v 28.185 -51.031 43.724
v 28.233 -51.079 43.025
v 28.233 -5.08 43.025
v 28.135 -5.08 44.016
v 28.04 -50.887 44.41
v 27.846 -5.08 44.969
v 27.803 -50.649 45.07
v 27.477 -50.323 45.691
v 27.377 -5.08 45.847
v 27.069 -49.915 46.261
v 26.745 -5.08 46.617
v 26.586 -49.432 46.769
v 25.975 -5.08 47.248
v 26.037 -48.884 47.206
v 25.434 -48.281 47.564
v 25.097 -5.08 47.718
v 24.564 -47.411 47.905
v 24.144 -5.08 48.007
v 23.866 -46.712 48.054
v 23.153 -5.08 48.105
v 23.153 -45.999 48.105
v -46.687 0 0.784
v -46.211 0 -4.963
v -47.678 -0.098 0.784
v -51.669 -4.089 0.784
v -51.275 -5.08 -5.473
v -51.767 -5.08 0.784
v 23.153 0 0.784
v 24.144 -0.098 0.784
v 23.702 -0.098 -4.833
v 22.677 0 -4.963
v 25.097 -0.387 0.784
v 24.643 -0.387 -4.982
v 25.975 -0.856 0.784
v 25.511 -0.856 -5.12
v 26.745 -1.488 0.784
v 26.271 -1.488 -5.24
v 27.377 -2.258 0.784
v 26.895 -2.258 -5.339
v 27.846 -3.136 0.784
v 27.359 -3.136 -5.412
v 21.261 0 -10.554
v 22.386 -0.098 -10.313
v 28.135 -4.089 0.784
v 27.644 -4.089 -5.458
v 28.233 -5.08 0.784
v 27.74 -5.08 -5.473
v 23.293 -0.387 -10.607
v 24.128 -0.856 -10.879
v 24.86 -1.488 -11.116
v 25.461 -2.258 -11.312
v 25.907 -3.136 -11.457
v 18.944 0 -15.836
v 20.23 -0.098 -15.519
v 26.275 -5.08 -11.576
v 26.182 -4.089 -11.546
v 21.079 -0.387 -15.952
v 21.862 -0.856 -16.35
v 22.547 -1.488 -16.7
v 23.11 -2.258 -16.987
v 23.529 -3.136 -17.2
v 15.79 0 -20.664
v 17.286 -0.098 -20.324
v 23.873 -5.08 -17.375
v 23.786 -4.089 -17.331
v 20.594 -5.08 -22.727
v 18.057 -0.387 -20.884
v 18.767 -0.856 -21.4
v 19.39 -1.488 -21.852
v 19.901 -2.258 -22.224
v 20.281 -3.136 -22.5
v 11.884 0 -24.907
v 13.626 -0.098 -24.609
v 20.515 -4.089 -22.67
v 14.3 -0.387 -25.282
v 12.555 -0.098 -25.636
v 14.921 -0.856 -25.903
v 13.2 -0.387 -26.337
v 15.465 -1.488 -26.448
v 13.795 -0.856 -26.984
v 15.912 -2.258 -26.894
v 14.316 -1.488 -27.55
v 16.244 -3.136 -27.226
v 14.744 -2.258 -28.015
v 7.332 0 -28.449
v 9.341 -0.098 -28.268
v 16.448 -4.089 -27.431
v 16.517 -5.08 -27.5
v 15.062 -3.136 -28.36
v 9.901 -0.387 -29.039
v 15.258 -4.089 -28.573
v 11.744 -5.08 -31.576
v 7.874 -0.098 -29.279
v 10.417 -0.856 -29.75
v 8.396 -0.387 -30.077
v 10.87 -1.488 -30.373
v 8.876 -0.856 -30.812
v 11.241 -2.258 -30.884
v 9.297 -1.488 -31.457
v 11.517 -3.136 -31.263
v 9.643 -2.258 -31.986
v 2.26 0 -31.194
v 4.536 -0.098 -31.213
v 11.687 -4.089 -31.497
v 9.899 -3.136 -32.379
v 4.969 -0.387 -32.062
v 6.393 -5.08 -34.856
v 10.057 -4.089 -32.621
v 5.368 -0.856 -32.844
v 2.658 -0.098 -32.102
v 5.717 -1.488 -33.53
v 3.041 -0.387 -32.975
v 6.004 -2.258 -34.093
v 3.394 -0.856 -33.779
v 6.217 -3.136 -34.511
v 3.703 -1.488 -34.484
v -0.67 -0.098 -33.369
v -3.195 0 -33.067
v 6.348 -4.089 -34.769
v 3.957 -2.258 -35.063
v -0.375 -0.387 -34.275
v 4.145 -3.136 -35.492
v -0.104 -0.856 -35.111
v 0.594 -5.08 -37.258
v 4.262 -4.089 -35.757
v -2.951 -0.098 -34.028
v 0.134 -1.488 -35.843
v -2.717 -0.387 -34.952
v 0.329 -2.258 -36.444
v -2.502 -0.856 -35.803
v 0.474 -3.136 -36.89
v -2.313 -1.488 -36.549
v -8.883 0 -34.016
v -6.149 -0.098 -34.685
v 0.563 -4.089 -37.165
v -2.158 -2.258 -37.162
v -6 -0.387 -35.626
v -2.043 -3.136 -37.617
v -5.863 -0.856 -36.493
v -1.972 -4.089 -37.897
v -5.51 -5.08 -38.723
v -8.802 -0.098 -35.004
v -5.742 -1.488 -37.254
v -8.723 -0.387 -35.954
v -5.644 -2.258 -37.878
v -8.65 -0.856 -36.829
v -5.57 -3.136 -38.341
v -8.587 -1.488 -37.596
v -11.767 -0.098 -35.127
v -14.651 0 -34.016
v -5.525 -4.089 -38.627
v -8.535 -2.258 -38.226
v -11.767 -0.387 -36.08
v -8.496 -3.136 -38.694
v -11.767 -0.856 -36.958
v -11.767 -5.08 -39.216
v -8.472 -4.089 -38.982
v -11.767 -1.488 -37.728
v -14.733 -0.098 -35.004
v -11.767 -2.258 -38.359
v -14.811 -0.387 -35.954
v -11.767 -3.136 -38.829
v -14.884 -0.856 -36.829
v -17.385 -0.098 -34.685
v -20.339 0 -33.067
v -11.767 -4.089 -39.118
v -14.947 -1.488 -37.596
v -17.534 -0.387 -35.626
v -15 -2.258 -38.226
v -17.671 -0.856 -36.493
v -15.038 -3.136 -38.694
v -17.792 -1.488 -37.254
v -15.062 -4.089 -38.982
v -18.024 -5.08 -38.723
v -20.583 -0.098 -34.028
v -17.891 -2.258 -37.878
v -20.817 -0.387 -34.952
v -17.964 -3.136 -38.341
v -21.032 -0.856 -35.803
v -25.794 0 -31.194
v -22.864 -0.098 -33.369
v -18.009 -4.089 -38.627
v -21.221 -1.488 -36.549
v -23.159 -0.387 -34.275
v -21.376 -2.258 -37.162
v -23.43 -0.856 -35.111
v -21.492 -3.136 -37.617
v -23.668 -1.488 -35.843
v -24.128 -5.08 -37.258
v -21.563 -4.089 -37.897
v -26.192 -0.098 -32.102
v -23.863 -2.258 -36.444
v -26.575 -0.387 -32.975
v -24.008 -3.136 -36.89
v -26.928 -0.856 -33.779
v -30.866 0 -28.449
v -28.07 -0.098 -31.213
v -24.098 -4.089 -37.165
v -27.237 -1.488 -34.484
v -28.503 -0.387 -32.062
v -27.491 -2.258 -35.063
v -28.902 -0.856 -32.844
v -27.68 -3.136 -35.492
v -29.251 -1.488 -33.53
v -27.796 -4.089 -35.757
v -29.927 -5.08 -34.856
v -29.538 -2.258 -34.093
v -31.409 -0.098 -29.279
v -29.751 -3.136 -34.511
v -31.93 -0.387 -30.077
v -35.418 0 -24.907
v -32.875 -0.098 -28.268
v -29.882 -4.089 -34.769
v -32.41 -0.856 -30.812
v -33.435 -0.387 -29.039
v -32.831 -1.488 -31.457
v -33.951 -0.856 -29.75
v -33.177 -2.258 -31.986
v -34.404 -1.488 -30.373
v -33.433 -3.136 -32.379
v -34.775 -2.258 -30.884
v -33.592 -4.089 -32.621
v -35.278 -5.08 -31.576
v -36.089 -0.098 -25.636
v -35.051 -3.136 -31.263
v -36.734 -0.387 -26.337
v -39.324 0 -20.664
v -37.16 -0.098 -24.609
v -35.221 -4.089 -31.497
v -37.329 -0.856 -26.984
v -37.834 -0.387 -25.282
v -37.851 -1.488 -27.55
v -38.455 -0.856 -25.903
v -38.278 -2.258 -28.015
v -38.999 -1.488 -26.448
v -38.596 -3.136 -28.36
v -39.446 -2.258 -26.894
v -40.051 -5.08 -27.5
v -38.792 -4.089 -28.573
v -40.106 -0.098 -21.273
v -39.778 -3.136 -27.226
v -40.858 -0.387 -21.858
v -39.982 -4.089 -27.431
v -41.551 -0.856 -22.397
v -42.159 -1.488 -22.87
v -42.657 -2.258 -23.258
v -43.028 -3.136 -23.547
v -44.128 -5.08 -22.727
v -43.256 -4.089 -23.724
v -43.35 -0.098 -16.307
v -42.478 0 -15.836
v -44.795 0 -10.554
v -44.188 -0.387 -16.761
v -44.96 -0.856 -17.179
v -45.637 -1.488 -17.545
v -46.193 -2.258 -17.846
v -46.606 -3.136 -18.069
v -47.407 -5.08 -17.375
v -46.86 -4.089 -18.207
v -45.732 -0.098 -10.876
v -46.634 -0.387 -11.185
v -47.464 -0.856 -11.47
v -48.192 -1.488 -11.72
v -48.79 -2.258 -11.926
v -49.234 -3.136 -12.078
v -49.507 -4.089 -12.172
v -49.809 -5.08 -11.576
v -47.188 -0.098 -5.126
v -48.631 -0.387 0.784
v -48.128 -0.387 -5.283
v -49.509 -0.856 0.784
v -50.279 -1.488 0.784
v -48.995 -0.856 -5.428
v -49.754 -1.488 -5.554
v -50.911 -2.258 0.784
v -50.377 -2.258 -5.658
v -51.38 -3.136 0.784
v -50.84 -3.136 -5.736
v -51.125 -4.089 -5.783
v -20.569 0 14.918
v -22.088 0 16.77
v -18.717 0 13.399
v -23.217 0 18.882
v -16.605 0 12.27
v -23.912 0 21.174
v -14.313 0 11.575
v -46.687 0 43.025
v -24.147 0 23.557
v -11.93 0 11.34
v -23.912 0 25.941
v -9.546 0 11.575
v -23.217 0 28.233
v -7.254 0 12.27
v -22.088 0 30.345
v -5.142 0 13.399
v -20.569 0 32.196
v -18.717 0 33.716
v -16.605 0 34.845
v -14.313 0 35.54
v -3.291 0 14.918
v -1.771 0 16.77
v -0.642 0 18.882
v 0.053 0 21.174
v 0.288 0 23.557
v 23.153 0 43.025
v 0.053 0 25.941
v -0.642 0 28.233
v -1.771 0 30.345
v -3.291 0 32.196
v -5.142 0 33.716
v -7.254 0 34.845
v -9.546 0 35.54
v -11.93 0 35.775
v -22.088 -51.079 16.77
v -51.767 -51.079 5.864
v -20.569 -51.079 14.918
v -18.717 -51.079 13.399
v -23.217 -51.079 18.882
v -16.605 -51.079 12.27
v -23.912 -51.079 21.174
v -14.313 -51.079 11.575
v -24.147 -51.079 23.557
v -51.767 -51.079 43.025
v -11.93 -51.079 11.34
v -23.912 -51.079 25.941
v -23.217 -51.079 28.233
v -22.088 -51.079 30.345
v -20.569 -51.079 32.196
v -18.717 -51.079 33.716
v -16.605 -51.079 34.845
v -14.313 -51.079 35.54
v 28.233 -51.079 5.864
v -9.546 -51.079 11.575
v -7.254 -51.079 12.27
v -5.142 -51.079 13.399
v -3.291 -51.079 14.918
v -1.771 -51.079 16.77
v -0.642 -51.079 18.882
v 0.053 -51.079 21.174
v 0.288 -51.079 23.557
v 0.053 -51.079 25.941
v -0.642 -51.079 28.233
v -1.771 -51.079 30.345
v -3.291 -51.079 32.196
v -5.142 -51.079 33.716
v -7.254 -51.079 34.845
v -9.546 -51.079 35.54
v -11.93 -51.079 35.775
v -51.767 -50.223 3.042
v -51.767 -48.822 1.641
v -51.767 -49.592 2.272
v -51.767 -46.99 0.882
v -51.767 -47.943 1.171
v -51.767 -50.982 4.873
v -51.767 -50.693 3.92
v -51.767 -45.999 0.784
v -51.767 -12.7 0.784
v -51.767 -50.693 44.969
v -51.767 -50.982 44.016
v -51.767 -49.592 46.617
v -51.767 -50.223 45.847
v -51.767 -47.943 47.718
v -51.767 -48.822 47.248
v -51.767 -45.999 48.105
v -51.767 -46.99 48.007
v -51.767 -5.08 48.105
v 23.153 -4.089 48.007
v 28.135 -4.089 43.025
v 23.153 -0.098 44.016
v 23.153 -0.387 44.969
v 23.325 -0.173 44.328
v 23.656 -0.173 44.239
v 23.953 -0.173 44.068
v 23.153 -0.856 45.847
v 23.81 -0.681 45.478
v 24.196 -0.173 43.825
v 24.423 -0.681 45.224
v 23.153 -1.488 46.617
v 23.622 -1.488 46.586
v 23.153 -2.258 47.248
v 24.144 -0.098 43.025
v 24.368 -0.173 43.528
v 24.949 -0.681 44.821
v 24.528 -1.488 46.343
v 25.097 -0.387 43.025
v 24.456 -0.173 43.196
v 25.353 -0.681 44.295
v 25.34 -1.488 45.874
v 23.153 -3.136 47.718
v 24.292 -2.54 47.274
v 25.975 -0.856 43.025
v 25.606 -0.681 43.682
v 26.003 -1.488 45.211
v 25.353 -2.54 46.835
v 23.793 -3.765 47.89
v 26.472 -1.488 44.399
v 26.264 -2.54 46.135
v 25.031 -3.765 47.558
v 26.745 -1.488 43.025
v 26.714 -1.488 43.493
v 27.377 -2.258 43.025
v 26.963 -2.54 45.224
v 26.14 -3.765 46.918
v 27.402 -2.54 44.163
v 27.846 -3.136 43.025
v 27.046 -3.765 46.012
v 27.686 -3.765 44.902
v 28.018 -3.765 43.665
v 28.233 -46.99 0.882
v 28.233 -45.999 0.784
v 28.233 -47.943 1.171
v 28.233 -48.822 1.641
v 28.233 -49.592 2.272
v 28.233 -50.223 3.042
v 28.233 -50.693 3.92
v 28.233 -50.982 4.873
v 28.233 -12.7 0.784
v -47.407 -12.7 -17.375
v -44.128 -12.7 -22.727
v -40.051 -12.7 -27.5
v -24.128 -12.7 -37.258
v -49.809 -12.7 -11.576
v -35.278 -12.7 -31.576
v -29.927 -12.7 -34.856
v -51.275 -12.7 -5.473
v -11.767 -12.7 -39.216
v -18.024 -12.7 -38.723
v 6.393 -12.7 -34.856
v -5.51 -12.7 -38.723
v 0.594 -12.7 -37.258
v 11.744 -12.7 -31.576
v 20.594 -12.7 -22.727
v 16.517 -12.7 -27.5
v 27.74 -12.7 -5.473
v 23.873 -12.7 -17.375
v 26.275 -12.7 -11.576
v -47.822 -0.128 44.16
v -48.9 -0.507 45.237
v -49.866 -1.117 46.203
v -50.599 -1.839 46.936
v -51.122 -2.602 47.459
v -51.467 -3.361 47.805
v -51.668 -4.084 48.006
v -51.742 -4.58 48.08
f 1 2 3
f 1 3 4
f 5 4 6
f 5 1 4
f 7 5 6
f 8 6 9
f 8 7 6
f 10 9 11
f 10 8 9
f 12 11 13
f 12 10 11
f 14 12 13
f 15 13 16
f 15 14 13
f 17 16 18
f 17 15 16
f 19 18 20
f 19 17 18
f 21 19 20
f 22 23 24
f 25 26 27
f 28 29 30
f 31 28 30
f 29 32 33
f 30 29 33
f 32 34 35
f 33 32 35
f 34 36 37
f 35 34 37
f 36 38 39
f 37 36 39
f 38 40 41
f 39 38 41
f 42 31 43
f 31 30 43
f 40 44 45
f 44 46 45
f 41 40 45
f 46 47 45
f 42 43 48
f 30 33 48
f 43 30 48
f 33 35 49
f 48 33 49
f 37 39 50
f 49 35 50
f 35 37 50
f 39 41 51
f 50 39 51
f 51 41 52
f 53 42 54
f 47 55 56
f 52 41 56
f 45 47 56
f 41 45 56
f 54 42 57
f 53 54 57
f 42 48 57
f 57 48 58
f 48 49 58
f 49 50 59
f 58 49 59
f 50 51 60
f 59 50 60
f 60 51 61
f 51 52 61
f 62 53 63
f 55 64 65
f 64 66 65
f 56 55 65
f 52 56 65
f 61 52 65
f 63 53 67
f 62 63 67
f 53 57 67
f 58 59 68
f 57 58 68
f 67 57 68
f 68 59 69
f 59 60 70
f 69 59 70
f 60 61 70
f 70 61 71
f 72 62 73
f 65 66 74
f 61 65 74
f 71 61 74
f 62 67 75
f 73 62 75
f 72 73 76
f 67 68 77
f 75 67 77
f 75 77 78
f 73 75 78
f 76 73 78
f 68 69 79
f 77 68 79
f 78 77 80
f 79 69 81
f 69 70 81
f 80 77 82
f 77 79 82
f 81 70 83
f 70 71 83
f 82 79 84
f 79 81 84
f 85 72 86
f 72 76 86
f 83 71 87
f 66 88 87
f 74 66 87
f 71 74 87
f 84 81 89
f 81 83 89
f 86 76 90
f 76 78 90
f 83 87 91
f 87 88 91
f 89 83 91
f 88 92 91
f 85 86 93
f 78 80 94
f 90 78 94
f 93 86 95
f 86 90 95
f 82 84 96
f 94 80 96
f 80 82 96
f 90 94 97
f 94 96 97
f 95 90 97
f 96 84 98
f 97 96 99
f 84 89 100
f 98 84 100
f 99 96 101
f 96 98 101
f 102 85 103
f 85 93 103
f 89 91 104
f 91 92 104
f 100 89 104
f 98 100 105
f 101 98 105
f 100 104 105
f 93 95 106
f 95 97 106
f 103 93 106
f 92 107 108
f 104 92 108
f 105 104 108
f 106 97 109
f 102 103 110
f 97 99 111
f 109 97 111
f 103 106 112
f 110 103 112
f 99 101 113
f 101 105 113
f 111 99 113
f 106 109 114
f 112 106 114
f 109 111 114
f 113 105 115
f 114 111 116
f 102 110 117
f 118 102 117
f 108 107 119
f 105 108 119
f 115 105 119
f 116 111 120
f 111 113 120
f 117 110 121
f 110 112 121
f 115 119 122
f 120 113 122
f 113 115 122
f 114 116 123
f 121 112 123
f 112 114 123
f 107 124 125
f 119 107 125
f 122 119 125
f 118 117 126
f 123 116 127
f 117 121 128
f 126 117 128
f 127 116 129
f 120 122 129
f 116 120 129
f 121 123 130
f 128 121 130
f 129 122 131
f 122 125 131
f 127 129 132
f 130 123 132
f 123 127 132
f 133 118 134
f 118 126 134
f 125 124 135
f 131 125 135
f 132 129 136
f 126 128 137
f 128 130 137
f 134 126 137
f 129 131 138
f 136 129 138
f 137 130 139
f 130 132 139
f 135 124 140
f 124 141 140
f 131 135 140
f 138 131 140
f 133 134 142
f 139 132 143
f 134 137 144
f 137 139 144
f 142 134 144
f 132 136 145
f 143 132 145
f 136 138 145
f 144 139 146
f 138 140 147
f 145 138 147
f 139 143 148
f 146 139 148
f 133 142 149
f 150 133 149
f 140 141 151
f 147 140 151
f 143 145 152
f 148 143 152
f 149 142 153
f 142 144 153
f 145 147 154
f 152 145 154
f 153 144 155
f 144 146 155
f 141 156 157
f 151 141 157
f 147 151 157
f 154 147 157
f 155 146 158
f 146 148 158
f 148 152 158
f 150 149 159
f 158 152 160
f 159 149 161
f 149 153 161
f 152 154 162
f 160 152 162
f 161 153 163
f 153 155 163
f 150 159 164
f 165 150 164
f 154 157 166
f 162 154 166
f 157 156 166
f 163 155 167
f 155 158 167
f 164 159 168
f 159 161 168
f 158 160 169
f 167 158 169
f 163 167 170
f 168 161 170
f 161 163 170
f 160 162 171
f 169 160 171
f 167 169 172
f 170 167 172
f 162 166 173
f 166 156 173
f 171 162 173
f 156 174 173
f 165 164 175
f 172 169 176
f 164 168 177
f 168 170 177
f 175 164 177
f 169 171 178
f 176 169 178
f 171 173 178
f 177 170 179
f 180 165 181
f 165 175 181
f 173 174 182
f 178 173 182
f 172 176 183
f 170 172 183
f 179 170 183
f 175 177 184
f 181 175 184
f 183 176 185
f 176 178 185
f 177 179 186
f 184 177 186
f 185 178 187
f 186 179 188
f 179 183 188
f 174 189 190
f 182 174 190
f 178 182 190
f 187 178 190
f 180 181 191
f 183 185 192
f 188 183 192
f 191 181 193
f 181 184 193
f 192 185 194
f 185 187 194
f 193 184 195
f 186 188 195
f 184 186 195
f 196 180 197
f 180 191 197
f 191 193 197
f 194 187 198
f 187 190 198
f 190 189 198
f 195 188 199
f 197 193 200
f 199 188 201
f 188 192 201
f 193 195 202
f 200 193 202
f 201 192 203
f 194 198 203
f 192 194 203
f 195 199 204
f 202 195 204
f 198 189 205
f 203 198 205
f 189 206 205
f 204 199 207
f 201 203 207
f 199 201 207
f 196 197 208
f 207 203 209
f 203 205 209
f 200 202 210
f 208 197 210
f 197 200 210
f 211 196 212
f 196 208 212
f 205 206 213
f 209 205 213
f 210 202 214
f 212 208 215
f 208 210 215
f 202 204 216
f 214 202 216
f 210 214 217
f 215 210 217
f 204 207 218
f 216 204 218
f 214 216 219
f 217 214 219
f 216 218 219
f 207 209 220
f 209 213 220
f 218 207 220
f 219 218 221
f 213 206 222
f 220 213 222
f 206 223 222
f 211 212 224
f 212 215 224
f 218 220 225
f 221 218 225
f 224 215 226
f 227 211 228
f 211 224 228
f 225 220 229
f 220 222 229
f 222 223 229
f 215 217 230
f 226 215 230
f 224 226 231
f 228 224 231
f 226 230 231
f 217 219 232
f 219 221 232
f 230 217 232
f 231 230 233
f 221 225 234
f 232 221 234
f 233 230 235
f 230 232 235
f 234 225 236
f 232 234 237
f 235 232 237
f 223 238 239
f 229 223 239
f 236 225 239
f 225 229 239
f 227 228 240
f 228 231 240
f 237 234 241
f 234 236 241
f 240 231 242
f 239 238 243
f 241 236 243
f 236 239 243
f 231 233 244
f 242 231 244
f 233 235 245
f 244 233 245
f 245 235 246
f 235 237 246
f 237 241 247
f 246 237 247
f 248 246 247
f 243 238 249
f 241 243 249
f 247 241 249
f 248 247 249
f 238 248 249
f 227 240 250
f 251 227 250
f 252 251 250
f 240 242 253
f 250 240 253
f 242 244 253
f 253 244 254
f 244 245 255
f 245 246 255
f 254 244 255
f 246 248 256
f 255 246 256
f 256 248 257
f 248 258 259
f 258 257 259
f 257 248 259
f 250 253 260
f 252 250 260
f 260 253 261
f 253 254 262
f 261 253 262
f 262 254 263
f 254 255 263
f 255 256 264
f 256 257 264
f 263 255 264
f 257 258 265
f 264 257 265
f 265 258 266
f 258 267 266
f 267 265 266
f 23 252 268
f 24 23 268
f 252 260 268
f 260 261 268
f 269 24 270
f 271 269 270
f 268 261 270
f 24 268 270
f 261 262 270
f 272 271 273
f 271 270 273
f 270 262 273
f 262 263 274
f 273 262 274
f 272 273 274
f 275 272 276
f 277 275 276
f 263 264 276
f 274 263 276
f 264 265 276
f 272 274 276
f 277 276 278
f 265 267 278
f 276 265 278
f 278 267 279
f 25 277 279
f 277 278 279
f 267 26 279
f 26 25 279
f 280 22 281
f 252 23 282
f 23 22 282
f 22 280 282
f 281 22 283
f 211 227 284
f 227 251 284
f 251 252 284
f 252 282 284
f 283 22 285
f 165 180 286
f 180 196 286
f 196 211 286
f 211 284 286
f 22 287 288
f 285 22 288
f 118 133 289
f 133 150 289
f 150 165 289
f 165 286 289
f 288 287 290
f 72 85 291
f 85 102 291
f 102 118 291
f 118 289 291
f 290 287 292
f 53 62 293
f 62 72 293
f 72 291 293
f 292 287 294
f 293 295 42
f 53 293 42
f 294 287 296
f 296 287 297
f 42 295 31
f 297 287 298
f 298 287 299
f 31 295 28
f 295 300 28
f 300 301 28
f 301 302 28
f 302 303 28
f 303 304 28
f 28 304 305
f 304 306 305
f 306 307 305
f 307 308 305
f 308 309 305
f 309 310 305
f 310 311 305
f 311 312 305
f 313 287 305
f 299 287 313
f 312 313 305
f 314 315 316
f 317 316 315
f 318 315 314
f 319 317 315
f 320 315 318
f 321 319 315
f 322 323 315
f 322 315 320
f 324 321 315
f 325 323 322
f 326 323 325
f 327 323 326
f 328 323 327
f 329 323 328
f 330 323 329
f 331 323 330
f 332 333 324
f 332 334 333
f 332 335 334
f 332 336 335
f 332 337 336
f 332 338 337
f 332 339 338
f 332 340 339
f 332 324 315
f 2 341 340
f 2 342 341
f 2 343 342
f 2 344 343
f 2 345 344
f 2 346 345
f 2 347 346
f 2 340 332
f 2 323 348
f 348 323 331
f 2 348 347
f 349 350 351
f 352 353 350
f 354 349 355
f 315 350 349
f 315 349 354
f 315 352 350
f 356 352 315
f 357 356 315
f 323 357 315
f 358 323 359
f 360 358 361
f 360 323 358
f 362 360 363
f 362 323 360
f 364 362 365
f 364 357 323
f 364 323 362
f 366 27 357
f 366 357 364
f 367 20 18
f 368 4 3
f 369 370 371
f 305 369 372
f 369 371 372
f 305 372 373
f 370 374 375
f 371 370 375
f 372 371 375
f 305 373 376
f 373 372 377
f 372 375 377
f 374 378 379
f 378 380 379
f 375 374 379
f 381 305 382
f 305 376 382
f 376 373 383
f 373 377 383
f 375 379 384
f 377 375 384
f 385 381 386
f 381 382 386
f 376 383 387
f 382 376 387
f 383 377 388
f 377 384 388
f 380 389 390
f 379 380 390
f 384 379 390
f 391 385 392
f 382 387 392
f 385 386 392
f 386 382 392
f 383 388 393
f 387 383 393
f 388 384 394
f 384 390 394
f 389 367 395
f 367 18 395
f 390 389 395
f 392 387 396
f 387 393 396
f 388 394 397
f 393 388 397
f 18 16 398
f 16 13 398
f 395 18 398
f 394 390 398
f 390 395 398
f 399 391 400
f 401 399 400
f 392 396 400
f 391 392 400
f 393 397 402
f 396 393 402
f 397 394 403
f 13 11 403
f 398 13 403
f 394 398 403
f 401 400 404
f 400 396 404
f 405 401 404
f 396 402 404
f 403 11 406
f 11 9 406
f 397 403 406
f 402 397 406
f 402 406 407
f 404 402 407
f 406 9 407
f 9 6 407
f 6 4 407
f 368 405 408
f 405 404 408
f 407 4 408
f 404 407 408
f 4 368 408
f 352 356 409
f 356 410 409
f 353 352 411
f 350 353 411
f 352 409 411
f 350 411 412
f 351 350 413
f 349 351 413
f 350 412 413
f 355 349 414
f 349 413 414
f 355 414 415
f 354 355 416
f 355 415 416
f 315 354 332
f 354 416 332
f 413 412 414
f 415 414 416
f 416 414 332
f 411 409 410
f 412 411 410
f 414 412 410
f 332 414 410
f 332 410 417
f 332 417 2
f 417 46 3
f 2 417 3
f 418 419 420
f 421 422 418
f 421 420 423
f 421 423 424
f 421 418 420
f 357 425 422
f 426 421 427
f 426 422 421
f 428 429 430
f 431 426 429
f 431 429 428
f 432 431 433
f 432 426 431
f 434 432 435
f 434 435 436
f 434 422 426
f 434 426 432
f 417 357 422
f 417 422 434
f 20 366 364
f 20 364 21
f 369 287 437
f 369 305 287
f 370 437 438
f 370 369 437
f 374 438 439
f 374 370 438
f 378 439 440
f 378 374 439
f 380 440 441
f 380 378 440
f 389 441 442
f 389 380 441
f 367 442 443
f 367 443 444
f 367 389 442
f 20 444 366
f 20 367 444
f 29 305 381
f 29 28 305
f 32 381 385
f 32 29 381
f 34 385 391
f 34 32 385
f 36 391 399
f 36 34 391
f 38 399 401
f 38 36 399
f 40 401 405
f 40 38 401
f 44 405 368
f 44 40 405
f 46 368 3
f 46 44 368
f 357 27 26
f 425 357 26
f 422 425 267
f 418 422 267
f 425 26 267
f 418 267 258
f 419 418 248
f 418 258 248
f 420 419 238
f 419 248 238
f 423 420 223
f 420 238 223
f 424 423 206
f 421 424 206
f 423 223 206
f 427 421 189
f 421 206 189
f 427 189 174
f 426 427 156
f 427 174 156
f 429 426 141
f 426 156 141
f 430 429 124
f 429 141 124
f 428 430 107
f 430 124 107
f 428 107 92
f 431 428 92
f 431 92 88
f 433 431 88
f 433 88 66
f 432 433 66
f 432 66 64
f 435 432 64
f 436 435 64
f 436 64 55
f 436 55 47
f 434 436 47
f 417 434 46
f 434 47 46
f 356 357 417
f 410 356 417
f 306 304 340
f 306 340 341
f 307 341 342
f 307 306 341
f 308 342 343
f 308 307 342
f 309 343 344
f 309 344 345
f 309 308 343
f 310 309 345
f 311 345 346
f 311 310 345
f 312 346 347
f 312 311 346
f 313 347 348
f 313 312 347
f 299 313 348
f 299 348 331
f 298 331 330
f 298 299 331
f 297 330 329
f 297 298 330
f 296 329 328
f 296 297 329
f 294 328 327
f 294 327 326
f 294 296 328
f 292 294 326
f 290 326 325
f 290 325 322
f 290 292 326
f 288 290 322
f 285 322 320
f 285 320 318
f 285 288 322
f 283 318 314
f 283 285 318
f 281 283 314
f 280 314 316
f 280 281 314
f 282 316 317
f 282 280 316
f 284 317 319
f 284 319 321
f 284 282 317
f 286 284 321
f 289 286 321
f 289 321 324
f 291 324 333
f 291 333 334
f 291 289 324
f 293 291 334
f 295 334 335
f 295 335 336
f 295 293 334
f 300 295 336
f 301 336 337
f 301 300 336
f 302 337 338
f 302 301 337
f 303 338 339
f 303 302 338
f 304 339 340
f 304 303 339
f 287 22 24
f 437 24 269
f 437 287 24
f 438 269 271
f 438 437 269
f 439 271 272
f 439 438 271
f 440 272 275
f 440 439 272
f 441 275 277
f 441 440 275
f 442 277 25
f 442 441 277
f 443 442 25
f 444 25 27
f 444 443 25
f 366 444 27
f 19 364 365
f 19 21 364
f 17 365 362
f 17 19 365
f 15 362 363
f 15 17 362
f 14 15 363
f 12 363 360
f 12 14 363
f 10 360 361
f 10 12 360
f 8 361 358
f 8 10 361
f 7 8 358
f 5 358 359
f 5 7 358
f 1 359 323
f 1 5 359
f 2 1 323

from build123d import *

# Parameters (mm, degrees)
F0_W     = 80
F0_H     = 47.3202
F0_R     = 12.2174
F1_DEPTH = 51.0794
F2_DEPTH = 12.7
F3_R     = 5.08
F4_R     = 5.08


with BuildPart() as f1:
    # F0 (on Front) → F1 (new body)
    with BuildSketch(Plane.XZ):
        with Locations((-11.767063, 24.444504)):
            Rectangle(F0_W, F0_H)
        with Locations((-11.929573, 23.557259)):
            Circle(F0_R, mode=Mode.SUBTRACT)
    extrude(amount=F1_DEPTH)

    # F0 (on Front) → F2 (join)
    with BuildSketch(Plane.XZ):
        with BuildLine():
            Line((28.232937, 0.784404), (-51.767063, 0.784404))
            ThreePointArc((-51.767063, 0.784404), (-11.767063, -39.215596), (28.232937, 0.784404))
        make_face()
    extrude(amount=F2_DEPTH)

    # F3
    f3_edges = [f1.edges().sort_by_distance(p)[0] for p in [
        (28.232937, -25.5397, 48.104604),
        (-11.767063, -51.0794, 0.784404),
        (-11.767063, -51.0794, 48.104604),
    ]]
    fillet(f3_edges, radius=F3_R)

    # F4
    f4_edges = [f1.edges().sort_by_distance(p)[0] for p in [
        (-14.307063, 0, 48.104604),
    ]]
    fillet(f4_edges, radius=F4_R)


solid = f1.part
